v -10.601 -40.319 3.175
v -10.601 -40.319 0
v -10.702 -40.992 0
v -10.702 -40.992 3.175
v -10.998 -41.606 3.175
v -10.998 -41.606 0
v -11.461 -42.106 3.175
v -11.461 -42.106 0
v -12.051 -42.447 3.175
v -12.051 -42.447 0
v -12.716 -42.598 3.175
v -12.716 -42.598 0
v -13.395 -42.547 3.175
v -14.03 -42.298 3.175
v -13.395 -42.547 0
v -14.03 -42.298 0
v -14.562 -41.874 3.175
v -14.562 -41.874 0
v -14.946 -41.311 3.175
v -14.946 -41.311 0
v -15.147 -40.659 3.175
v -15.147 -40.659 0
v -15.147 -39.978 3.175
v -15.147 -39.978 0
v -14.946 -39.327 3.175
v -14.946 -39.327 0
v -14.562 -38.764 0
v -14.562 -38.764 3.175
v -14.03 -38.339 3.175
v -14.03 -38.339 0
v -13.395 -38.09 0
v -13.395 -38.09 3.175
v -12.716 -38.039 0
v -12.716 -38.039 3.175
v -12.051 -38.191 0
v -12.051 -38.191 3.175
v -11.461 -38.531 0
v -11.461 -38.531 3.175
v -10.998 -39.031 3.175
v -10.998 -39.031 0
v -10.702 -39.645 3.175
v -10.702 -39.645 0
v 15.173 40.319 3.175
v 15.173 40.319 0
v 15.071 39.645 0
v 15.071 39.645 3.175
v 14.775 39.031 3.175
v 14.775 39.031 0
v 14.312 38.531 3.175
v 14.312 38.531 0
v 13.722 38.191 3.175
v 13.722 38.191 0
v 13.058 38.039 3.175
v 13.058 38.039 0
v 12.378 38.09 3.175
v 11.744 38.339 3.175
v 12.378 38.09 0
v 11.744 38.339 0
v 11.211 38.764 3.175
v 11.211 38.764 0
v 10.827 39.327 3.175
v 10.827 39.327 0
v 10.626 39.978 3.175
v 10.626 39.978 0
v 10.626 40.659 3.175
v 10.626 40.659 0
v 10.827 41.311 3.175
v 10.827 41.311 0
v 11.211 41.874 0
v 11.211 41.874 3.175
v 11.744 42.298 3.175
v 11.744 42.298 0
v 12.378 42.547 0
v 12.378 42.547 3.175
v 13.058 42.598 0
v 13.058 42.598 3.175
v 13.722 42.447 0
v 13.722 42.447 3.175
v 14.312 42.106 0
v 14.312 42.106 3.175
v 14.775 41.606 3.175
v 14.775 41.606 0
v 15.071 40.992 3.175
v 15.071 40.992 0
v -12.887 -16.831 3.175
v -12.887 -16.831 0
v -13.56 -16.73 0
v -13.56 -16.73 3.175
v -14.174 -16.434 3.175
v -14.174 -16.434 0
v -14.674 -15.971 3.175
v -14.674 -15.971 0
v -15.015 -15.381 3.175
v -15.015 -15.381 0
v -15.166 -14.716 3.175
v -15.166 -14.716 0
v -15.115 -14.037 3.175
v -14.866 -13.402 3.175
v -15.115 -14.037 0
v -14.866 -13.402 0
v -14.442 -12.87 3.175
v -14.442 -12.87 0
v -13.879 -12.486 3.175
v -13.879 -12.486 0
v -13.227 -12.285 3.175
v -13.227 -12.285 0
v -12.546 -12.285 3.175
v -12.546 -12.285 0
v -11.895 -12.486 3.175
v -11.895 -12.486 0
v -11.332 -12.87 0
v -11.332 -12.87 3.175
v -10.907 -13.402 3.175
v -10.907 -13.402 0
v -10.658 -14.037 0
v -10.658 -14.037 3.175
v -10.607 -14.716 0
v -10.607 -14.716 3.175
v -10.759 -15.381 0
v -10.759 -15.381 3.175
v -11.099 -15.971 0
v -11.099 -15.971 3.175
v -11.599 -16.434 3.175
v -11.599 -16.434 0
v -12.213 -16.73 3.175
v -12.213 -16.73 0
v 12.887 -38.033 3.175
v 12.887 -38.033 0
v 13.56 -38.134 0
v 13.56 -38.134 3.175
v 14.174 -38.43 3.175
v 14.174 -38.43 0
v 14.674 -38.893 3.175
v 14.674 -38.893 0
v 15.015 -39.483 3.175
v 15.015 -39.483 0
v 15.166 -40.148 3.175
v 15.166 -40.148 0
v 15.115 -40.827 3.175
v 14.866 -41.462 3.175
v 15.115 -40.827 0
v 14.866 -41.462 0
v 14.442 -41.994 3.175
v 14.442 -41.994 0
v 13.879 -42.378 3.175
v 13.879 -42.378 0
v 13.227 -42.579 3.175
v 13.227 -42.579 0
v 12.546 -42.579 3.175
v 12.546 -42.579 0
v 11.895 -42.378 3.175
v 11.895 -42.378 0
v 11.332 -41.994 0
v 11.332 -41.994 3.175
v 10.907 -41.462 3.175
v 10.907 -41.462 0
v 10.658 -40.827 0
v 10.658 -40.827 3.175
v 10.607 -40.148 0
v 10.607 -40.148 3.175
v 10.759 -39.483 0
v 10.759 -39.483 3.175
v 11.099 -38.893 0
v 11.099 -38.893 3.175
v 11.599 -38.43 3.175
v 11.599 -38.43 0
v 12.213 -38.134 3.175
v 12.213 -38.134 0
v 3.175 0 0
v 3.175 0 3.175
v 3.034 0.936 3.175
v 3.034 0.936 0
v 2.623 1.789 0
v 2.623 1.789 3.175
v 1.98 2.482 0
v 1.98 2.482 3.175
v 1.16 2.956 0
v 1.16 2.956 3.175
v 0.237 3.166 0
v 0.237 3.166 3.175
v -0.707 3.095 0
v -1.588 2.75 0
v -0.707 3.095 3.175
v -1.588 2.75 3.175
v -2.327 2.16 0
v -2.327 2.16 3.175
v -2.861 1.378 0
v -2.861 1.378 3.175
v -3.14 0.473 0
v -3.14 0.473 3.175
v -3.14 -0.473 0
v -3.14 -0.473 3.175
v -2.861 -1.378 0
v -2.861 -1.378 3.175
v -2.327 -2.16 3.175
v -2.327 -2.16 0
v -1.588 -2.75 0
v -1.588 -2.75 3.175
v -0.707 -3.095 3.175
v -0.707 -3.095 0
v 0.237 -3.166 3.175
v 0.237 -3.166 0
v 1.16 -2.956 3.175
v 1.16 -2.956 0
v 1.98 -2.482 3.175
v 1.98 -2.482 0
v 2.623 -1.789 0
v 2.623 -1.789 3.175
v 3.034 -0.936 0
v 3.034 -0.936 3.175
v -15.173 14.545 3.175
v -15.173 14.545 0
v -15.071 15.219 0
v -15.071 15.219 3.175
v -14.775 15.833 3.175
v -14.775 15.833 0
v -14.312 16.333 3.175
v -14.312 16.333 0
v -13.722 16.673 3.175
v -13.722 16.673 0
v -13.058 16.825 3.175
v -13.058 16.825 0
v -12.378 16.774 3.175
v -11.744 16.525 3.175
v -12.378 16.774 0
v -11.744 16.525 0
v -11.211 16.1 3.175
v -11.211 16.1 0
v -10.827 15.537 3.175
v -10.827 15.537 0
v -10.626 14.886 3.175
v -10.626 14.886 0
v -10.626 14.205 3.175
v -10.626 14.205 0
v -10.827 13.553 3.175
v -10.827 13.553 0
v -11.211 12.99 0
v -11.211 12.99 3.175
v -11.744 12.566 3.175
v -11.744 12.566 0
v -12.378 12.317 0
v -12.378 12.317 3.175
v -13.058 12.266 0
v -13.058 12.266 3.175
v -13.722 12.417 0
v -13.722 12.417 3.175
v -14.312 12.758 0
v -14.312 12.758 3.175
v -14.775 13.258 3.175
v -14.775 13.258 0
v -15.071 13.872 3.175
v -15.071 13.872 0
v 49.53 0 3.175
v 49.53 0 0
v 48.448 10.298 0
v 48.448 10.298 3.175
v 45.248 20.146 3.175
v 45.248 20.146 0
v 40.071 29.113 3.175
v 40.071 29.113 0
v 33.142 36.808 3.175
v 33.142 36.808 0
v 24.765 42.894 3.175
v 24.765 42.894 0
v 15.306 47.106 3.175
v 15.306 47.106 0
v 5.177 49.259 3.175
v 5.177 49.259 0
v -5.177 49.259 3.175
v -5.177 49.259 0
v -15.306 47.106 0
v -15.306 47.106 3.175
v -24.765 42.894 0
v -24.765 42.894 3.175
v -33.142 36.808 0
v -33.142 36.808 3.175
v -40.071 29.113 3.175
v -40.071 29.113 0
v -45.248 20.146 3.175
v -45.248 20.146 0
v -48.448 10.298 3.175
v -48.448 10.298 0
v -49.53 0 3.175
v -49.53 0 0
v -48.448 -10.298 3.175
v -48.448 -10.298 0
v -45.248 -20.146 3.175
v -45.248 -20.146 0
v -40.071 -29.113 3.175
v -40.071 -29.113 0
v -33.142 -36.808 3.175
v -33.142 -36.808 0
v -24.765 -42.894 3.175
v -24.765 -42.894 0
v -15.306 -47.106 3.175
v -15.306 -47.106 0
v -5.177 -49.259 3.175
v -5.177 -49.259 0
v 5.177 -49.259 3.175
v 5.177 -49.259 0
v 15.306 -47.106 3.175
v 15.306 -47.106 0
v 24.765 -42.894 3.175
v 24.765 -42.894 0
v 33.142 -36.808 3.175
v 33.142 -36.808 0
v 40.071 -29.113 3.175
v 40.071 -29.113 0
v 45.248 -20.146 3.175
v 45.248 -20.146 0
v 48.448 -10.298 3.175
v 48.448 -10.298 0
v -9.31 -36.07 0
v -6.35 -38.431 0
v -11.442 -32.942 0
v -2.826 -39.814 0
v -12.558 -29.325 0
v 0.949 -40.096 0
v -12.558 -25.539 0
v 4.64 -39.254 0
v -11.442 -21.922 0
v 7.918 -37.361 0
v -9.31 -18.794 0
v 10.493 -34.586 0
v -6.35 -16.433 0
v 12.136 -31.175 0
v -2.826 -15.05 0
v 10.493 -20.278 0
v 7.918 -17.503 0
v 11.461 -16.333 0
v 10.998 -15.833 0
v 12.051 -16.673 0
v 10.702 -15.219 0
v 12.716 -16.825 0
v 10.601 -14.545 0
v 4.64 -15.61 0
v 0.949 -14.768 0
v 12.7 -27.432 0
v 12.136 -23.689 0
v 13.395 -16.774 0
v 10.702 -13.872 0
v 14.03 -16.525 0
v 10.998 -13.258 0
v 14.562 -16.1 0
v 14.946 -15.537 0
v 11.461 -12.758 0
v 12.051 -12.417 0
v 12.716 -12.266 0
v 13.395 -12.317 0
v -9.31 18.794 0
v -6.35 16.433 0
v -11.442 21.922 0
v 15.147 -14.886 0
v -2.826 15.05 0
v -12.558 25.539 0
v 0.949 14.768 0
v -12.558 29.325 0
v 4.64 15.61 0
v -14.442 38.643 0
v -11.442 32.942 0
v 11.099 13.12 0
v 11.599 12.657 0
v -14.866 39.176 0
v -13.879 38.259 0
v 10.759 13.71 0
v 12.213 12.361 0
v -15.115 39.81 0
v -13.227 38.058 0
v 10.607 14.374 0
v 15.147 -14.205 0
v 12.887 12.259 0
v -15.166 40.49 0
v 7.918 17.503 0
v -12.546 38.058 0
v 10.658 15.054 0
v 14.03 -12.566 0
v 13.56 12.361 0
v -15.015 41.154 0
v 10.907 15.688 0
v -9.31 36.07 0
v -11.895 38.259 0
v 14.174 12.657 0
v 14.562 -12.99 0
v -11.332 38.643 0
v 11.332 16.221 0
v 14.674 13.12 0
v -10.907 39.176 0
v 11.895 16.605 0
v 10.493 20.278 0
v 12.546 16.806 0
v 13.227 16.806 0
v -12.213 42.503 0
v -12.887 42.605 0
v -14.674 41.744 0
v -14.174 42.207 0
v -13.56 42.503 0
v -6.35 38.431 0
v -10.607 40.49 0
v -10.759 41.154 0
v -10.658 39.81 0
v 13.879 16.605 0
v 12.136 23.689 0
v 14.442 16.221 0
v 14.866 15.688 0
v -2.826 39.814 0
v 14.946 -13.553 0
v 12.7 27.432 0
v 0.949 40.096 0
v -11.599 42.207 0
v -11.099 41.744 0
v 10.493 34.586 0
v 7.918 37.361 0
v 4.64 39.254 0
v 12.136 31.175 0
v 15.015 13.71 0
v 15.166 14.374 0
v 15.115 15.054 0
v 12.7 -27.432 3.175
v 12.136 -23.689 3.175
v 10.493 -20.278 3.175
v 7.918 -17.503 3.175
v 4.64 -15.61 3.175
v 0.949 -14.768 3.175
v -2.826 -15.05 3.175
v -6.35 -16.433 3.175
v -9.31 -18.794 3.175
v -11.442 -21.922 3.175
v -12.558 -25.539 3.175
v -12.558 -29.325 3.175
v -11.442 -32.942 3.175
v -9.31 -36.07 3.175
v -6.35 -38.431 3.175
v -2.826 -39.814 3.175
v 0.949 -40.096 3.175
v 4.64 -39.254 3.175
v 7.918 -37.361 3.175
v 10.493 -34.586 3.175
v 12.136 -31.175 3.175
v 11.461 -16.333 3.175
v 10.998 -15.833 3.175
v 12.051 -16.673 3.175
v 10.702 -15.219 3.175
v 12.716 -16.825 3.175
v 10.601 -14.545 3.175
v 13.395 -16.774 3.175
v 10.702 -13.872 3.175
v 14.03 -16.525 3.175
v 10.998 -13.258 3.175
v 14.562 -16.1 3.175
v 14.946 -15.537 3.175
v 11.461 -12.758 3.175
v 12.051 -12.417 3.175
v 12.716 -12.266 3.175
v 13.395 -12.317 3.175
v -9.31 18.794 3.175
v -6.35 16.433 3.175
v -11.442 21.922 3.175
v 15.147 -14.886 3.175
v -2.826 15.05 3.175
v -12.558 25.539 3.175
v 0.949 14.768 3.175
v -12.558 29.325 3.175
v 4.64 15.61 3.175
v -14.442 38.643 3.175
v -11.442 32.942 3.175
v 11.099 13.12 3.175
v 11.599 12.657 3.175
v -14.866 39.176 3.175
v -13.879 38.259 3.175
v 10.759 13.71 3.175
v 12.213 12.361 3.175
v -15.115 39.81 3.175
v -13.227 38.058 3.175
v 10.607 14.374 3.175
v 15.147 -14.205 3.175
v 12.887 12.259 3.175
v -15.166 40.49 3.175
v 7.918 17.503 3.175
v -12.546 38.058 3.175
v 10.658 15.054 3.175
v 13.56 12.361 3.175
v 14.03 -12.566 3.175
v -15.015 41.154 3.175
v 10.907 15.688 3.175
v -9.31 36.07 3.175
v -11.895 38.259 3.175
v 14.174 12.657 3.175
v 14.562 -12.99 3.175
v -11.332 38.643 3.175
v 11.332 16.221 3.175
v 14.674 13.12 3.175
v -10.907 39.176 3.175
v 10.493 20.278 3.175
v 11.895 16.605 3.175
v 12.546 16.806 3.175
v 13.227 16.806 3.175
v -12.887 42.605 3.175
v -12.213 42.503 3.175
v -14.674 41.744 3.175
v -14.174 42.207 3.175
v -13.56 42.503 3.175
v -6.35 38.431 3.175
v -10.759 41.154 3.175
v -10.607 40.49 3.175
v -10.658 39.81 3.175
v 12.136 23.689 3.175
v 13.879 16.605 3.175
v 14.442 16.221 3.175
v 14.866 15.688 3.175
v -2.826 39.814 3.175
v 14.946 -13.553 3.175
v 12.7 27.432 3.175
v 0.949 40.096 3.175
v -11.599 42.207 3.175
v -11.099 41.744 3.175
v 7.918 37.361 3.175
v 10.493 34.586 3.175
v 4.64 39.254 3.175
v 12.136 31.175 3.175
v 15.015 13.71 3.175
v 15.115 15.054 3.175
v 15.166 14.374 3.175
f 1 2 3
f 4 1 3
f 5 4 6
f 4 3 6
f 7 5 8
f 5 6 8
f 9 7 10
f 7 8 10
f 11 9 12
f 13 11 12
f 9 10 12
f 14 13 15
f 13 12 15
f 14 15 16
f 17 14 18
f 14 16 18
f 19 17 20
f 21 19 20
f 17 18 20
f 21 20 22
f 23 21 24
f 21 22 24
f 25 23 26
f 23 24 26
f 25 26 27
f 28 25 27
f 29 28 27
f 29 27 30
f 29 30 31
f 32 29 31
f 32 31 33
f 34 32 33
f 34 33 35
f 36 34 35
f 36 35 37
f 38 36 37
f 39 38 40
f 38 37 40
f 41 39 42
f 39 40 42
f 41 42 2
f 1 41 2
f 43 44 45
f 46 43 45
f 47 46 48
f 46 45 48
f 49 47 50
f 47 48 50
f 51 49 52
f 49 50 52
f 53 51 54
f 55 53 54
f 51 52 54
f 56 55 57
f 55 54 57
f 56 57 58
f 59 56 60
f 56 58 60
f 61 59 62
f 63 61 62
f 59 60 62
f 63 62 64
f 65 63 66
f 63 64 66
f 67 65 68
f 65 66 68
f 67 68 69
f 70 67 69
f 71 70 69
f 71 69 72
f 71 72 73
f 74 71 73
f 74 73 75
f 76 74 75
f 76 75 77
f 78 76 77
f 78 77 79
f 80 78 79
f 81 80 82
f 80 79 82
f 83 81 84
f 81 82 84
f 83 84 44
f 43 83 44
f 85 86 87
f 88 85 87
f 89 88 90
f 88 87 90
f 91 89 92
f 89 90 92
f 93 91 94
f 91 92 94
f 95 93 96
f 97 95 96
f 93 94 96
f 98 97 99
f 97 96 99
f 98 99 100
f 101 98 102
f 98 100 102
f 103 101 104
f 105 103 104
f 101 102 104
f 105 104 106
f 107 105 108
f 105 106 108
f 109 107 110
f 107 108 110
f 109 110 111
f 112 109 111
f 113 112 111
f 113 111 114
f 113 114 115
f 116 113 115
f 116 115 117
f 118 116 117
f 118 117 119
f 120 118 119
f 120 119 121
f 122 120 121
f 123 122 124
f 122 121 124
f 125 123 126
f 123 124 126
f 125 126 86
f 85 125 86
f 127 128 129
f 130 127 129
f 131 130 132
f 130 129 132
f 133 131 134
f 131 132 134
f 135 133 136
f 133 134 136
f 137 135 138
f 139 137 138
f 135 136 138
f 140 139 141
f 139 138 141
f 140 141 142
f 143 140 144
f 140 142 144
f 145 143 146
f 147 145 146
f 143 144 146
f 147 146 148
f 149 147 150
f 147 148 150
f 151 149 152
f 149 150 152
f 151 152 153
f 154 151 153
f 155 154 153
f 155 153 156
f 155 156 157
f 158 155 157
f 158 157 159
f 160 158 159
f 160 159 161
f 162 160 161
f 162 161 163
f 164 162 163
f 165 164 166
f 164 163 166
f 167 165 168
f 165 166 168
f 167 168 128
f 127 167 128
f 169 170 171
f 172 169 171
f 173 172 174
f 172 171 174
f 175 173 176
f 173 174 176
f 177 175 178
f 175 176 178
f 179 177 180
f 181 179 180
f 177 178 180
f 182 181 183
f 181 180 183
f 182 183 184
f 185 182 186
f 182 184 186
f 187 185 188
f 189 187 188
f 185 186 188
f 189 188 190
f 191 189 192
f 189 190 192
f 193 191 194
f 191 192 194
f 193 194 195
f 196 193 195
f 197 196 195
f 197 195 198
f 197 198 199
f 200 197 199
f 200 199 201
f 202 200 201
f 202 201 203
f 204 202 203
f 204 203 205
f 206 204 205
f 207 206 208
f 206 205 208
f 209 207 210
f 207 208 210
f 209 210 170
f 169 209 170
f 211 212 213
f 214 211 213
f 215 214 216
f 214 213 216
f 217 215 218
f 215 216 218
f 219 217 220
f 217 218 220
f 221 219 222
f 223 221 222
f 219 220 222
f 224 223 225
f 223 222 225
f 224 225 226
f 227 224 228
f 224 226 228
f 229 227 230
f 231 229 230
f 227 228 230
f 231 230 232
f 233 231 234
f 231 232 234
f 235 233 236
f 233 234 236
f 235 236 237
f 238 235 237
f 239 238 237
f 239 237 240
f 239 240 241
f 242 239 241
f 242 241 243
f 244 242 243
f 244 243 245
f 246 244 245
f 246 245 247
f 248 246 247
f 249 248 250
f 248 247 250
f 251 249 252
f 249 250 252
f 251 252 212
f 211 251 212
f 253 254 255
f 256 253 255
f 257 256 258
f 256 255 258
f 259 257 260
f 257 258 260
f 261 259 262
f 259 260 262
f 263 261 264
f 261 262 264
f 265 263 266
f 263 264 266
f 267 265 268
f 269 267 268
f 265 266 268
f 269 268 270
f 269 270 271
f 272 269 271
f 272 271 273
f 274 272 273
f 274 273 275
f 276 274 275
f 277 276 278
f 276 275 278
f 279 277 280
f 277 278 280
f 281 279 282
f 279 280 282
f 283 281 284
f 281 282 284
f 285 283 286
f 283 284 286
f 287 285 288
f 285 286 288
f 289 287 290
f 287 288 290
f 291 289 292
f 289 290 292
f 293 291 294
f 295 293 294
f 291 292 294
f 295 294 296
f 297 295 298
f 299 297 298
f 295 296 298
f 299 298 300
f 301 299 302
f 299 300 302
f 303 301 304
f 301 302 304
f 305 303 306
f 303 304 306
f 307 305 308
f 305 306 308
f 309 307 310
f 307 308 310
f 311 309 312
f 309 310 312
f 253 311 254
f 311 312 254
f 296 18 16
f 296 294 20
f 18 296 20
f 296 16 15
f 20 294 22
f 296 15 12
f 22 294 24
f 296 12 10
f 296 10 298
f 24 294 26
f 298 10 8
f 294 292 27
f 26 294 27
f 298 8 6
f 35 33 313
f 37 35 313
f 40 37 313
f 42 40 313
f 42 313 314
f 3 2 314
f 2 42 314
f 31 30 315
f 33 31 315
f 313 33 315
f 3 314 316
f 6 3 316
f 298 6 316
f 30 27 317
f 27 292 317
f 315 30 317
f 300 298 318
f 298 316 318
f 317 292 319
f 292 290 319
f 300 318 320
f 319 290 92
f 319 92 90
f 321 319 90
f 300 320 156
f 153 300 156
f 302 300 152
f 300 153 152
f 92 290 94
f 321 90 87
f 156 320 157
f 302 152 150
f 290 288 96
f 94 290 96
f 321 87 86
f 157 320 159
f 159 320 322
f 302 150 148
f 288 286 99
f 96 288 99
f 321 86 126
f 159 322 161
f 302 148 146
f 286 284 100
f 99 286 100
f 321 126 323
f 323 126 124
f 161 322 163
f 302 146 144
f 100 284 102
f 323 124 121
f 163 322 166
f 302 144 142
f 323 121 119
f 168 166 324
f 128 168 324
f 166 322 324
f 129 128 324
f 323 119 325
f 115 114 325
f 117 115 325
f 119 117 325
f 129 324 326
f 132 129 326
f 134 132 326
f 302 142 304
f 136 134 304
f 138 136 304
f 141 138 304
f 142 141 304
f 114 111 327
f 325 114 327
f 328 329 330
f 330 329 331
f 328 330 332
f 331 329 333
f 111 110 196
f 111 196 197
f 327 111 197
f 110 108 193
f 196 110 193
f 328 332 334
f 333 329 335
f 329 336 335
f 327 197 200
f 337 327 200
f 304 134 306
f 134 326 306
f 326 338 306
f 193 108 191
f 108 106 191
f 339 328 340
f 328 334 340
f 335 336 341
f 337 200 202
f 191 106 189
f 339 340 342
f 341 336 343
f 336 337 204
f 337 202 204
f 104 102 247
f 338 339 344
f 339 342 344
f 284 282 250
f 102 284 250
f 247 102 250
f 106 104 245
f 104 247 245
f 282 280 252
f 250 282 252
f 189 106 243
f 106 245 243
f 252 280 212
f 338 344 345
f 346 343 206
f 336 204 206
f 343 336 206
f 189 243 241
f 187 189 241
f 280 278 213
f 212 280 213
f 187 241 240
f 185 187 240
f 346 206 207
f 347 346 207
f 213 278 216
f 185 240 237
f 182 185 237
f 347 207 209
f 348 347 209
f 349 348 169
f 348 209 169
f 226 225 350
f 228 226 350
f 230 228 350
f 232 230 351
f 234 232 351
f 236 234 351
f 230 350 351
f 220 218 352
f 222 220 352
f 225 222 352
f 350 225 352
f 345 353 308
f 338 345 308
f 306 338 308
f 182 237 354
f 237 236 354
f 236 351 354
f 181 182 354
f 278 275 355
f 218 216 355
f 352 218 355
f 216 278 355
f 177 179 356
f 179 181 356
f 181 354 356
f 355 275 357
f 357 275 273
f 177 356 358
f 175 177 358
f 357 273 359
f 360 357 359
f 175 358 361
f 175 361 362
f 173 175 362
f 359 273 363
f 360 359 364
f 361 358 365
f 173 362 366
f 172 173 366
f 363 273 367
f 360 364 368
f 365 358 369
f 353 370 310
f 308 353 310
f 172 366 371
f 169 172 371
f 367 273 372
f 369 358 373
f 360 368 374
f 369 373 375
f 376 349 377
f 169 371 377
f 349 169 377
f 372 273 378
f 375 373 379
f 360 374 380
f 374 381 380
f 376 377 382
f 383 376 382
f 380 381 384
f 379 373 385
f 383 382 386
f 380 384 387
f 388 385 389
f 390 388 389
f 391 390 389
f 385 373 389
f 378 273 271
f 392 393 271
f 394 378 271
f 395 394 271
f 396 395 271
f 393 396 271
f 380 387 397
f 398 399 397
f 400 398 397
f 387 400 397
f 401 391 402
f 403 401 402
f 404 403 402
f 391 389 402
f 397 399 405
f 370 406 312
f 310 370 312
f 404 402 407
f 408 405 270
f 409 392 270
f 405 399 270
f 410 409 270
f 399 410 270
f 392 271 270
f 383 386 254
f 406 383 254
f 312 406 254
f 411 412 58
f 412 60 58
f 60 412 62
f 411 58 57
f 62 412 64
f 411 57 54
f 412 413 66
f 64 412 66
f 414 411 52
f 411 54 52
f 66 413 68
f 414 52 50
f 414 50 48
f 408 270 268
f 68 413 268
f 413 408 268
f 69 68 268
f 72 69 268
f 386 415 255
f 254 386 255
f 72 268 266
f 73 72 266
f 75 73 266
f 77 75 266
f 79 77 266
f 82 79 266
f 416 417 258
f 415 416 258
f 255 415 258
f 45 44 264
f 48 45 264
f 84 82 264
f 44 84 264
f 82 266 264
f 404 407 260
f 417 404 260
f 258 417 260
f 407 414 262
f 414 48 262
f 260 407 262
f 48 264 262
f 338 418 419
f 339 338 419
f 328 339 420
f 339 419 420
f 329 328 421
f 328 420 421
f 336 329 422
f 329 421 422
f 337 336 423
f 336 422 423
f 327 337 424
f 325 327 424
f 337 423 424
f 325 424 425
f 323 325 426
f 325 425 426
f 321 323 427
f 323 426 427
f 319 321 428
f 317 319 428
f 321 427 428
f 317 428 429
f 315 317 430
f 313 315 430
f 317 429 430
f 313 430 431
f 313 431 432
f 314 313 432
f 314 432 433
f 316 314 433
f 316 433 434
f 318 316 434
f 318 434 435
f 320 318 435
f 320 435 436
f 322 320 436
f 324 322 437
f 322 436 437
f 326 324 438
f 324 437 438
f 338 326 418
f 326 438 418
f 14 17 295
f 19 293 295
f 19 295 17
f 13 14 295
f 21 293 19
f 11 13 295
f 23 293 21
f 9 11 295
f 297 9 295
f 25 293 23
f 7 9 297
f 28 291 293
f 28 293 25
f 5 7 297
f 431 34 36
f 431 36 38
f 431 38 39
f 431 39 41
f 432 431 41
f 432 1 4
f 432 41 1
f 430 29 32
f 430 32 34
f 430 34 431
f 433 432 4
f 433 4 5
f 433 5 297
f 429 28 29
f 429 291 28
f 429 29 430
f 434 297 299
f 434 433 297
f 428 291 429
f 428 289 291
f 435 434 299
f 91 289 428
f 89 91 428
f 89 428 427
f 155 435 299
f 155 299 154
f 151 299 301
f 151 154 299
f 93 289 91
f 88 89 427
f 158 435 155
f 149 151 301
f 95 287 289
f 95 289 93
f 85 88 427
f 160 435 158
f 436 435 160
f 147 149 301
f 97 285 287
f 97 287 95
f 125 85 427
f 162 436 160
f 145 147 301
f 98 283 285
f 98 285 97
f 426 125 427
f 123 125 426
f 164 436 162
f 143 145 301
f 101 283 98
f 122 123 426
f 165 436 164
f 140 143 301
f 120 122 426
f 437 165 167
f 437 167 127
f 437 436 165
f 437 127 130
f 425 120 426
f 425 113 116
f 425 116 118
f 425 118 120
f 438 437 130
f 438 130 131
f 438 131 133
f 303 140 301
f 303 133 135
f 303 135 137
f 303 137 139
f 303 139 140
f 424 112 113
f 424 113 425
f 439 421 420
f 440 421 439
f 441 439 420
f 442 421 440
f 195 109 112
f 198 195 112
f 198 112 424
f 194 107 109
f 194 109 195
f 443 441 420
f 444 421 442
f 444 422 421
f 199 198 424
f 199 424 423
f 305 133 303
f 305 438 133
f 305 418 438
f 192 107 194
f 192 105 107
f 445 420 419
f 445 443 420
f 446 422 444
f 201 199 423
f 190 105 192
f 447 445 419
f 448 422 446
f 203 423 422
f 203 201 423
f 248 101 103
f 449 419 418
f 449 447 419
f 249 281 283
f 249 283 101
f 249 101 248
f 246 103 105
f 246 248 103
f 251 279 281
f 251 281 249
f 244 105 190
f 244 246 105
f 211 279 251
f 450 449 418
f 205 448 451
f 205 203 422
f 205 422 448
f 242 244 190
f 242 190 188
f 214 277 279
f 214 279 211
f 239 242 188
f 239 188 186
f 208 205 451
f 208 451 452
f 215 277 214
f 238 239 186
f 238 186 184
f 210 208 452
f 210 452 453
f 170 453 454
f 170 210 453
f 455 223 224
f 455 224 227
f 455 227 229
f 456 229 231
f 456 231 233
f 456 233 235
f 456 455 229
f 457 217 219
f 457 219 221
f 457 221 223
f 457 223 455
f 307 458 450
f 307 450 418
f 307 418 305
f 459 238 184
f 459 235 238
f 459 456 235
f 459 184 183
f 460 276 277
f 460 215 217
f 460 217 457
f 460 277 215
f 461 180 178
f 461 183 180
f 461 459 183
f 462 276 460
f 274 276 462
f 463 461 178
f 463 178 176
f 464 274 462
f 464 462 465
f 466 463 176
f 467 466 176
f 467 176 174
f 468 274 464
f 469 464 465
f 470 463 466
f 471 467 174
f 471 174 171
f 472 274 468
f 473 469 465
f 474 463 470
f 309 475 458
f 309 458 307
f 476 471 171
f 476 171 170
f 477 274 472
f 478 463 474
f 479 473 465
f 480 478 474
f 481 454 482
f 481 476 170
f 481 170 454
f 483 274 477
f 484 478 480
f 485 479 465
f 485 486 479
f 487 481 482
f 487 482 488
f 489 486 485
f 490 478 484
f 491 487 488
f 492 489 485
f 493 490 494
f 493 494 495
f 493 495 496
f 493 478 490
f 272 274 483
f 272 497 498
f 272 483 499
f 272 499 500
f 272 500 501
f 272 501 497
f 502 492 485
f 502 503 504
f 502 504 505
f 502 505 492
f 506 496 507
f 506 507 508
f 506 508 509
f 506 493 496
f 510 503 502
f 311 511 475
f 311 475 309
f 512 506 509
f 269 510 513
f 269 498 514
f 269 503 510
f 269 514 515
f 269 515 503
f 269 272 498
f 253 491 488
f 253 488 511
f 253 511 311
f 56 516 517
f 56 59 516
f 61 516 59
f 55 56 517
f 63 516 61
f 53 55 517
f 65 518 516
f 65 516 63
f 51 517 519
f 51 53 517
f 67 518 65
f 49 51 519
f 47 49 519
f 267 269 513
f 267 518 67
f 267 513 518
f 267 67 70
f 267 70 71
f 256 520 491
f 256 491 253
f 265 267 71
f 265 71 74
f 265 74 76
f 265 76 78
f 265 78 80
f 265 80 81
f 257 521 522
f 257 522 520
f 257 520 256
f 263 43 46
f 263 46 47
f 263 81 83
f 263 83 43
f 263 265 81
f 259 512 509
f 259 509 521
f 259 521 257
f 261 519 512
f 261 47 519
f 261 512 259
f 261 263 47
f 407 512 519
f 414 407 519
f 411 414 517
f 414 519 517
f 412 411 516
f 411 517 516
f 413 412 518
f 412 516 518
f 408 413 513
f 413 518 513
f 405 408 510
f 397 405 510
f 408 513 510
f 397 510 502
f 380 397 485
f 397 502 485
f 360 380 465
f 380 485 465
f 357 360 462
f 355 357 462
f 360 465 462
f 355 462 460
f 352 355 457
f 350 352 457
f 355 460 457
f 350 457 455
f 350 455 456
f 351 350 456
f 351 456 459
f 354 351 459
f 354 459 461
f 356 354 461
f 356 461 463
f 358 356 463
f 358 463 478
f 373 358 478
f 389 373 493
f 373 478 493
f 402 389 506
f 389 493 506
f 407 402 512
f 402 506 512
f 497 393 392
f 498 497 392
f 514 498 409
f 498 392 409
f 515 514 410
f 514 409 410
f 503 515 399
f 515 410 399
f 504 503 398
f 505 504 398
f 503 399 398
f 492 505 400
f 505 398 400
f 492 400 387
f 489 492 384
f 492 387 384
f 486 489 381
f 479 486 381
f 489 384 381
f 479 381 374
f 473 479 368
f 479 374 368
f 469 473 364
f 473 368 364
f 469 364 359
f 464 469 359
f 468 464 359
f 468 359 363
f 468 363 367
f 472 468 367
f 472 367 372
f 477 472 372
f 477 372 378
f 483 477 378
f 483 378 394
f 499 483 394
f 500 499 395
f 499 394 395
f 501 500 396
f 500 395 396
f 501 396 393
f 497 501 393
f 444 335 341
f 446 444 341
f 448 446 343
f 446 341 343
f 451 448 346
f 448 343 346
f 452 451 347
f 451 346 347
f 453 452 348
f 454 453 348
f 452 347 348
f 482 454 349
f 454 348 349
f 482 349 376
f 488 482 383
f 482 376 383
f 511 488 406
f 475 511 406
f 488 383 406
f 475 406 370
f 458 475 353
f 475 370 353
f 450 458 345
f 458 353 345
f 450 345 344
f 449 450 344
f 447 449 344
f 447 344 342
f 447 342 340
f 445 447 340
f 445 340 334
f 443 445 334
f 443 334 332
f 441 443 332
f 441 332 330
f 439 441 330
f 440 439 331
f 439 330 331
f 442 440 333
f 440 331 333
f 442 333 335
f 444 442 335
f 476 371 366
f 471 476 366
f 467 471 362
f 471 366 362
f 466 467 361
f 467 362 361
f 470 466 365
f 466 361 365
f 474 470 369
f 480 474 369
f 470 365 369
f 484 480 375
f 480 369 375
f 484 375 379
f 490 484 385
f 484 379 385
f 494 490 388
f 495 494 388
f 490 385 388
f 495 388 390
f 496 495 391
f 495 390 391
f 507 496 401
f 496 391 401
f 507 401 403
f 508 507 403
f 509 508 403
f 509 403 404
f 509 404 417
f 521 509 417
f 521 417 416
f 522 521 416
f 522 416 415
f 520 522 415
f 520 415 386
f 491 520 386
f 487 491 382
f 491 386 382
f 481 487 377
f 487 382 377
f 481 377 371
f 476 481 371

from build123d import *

# Parameters (mm, degrees)
SKETCH1_R           = 49.53
BOSS_EXTRUDE1_DEPTH = 3.175
SKETCH2_R           = 12.7
CUT_EXTRUDE1_DEPTH  = 3.175
SKETCH3_R           = 3.175
CUT_EXTRUDE2_DEPTH  = 3.175
SKETCH5_R           = 2.286
CUT_EXTRUDE3_DEPTH  = 3.175
CIRPATTERN1_COUNT   = 4
SKETCH6_R           = 2.286
CUT_EXTRUDE4_DEPTH  = 3.175
CIRPATTERN2_COUNT   = 4


with BuildPart() as part:
    # Sketch1 → Boss-Extrude1 (new body)
    with BuildSketch(Plane.XY):
        Circle(SKETCH1_R)
    extrude(amount=BOSS_EXTRUDE1_DEPTH)

    # Sketch2 → Cut-Extrude1 (cut)
    with BuildSketch(Plane.XY.offset(3.175)):
        with Locations((0, 27.432)):
            Circle(SKETCH2_R)
        with Locations((0, -27.432)):
            Circle(SKETCH2_R)
    extrude(amount=-CUT_EXTRUDE1_DEPTH, mode=Mode.SUBTRACT)

    # Sketch3 → Cut-Extrude2 (cut)
    with BuildSketch(Plane.XY.offset(3.175)):
        Circle(SKETCH3_R)
    extrude(amount=-CUT_EXTRUDE2_DEPTH, mode=Mode.SUBTRACT)

    # Sketch5 → Cut-Extrude3 (cut)
    with BuildSketch(Plane(origin=(0, 0, 0), x_dir=(-1, 0, 0), z_dir=(0, 0, -1))):
        with Locations((-12.886667534, -14.545332466)):
            Circle(SKETCH5_R)
    cut_extrude3 = extrude(amount=-CUT_EXTRUDE3_DEPTH, mode=Mode.SUBTRACT)

    # CirPattern1: Cut-Extrude3 ×4 about axis
    cirpattern1_axis = Axis((0, -27.432, 0), (0, 0, 1))
    for i in range(1, CIRPATTERN1_COUNT):
        add(cut_extrude3.rotate(cirpattern1_axis, i * 360 / CIRPATTERN1_COUNT), mode=Mode.SUBTRACT)

    # Sketch6 → Cut-Extrude4 (cut)
    with BuildSketch(Plane(origin=(0, 0, 0), x_dir=(-1, 0, 0), z_dir=(0, 0, -1))):
        with Locations((12.886667534, 14.545332466)):
            Circle(SKETCH6_R)
    cut_extrude4 = extrude(amount=-CUT_EXTRUDE4_DEPTH, mode=Mode.SUBTRACT)

    # CirPattern2: Cut-Extrude4 ×4 about axis
    cirpattern2_axis = Axis((0, 27.432, 0), (0, 0, 1))
    for i in range(1, CIRPATTERN2_COUNT):
        add(cut_extrude4.rotate(cirpattern2_axis, i * 360 / CIRPATTERN2_COUNT), mode=Mode.SUBTRACT)


solid = part.part
